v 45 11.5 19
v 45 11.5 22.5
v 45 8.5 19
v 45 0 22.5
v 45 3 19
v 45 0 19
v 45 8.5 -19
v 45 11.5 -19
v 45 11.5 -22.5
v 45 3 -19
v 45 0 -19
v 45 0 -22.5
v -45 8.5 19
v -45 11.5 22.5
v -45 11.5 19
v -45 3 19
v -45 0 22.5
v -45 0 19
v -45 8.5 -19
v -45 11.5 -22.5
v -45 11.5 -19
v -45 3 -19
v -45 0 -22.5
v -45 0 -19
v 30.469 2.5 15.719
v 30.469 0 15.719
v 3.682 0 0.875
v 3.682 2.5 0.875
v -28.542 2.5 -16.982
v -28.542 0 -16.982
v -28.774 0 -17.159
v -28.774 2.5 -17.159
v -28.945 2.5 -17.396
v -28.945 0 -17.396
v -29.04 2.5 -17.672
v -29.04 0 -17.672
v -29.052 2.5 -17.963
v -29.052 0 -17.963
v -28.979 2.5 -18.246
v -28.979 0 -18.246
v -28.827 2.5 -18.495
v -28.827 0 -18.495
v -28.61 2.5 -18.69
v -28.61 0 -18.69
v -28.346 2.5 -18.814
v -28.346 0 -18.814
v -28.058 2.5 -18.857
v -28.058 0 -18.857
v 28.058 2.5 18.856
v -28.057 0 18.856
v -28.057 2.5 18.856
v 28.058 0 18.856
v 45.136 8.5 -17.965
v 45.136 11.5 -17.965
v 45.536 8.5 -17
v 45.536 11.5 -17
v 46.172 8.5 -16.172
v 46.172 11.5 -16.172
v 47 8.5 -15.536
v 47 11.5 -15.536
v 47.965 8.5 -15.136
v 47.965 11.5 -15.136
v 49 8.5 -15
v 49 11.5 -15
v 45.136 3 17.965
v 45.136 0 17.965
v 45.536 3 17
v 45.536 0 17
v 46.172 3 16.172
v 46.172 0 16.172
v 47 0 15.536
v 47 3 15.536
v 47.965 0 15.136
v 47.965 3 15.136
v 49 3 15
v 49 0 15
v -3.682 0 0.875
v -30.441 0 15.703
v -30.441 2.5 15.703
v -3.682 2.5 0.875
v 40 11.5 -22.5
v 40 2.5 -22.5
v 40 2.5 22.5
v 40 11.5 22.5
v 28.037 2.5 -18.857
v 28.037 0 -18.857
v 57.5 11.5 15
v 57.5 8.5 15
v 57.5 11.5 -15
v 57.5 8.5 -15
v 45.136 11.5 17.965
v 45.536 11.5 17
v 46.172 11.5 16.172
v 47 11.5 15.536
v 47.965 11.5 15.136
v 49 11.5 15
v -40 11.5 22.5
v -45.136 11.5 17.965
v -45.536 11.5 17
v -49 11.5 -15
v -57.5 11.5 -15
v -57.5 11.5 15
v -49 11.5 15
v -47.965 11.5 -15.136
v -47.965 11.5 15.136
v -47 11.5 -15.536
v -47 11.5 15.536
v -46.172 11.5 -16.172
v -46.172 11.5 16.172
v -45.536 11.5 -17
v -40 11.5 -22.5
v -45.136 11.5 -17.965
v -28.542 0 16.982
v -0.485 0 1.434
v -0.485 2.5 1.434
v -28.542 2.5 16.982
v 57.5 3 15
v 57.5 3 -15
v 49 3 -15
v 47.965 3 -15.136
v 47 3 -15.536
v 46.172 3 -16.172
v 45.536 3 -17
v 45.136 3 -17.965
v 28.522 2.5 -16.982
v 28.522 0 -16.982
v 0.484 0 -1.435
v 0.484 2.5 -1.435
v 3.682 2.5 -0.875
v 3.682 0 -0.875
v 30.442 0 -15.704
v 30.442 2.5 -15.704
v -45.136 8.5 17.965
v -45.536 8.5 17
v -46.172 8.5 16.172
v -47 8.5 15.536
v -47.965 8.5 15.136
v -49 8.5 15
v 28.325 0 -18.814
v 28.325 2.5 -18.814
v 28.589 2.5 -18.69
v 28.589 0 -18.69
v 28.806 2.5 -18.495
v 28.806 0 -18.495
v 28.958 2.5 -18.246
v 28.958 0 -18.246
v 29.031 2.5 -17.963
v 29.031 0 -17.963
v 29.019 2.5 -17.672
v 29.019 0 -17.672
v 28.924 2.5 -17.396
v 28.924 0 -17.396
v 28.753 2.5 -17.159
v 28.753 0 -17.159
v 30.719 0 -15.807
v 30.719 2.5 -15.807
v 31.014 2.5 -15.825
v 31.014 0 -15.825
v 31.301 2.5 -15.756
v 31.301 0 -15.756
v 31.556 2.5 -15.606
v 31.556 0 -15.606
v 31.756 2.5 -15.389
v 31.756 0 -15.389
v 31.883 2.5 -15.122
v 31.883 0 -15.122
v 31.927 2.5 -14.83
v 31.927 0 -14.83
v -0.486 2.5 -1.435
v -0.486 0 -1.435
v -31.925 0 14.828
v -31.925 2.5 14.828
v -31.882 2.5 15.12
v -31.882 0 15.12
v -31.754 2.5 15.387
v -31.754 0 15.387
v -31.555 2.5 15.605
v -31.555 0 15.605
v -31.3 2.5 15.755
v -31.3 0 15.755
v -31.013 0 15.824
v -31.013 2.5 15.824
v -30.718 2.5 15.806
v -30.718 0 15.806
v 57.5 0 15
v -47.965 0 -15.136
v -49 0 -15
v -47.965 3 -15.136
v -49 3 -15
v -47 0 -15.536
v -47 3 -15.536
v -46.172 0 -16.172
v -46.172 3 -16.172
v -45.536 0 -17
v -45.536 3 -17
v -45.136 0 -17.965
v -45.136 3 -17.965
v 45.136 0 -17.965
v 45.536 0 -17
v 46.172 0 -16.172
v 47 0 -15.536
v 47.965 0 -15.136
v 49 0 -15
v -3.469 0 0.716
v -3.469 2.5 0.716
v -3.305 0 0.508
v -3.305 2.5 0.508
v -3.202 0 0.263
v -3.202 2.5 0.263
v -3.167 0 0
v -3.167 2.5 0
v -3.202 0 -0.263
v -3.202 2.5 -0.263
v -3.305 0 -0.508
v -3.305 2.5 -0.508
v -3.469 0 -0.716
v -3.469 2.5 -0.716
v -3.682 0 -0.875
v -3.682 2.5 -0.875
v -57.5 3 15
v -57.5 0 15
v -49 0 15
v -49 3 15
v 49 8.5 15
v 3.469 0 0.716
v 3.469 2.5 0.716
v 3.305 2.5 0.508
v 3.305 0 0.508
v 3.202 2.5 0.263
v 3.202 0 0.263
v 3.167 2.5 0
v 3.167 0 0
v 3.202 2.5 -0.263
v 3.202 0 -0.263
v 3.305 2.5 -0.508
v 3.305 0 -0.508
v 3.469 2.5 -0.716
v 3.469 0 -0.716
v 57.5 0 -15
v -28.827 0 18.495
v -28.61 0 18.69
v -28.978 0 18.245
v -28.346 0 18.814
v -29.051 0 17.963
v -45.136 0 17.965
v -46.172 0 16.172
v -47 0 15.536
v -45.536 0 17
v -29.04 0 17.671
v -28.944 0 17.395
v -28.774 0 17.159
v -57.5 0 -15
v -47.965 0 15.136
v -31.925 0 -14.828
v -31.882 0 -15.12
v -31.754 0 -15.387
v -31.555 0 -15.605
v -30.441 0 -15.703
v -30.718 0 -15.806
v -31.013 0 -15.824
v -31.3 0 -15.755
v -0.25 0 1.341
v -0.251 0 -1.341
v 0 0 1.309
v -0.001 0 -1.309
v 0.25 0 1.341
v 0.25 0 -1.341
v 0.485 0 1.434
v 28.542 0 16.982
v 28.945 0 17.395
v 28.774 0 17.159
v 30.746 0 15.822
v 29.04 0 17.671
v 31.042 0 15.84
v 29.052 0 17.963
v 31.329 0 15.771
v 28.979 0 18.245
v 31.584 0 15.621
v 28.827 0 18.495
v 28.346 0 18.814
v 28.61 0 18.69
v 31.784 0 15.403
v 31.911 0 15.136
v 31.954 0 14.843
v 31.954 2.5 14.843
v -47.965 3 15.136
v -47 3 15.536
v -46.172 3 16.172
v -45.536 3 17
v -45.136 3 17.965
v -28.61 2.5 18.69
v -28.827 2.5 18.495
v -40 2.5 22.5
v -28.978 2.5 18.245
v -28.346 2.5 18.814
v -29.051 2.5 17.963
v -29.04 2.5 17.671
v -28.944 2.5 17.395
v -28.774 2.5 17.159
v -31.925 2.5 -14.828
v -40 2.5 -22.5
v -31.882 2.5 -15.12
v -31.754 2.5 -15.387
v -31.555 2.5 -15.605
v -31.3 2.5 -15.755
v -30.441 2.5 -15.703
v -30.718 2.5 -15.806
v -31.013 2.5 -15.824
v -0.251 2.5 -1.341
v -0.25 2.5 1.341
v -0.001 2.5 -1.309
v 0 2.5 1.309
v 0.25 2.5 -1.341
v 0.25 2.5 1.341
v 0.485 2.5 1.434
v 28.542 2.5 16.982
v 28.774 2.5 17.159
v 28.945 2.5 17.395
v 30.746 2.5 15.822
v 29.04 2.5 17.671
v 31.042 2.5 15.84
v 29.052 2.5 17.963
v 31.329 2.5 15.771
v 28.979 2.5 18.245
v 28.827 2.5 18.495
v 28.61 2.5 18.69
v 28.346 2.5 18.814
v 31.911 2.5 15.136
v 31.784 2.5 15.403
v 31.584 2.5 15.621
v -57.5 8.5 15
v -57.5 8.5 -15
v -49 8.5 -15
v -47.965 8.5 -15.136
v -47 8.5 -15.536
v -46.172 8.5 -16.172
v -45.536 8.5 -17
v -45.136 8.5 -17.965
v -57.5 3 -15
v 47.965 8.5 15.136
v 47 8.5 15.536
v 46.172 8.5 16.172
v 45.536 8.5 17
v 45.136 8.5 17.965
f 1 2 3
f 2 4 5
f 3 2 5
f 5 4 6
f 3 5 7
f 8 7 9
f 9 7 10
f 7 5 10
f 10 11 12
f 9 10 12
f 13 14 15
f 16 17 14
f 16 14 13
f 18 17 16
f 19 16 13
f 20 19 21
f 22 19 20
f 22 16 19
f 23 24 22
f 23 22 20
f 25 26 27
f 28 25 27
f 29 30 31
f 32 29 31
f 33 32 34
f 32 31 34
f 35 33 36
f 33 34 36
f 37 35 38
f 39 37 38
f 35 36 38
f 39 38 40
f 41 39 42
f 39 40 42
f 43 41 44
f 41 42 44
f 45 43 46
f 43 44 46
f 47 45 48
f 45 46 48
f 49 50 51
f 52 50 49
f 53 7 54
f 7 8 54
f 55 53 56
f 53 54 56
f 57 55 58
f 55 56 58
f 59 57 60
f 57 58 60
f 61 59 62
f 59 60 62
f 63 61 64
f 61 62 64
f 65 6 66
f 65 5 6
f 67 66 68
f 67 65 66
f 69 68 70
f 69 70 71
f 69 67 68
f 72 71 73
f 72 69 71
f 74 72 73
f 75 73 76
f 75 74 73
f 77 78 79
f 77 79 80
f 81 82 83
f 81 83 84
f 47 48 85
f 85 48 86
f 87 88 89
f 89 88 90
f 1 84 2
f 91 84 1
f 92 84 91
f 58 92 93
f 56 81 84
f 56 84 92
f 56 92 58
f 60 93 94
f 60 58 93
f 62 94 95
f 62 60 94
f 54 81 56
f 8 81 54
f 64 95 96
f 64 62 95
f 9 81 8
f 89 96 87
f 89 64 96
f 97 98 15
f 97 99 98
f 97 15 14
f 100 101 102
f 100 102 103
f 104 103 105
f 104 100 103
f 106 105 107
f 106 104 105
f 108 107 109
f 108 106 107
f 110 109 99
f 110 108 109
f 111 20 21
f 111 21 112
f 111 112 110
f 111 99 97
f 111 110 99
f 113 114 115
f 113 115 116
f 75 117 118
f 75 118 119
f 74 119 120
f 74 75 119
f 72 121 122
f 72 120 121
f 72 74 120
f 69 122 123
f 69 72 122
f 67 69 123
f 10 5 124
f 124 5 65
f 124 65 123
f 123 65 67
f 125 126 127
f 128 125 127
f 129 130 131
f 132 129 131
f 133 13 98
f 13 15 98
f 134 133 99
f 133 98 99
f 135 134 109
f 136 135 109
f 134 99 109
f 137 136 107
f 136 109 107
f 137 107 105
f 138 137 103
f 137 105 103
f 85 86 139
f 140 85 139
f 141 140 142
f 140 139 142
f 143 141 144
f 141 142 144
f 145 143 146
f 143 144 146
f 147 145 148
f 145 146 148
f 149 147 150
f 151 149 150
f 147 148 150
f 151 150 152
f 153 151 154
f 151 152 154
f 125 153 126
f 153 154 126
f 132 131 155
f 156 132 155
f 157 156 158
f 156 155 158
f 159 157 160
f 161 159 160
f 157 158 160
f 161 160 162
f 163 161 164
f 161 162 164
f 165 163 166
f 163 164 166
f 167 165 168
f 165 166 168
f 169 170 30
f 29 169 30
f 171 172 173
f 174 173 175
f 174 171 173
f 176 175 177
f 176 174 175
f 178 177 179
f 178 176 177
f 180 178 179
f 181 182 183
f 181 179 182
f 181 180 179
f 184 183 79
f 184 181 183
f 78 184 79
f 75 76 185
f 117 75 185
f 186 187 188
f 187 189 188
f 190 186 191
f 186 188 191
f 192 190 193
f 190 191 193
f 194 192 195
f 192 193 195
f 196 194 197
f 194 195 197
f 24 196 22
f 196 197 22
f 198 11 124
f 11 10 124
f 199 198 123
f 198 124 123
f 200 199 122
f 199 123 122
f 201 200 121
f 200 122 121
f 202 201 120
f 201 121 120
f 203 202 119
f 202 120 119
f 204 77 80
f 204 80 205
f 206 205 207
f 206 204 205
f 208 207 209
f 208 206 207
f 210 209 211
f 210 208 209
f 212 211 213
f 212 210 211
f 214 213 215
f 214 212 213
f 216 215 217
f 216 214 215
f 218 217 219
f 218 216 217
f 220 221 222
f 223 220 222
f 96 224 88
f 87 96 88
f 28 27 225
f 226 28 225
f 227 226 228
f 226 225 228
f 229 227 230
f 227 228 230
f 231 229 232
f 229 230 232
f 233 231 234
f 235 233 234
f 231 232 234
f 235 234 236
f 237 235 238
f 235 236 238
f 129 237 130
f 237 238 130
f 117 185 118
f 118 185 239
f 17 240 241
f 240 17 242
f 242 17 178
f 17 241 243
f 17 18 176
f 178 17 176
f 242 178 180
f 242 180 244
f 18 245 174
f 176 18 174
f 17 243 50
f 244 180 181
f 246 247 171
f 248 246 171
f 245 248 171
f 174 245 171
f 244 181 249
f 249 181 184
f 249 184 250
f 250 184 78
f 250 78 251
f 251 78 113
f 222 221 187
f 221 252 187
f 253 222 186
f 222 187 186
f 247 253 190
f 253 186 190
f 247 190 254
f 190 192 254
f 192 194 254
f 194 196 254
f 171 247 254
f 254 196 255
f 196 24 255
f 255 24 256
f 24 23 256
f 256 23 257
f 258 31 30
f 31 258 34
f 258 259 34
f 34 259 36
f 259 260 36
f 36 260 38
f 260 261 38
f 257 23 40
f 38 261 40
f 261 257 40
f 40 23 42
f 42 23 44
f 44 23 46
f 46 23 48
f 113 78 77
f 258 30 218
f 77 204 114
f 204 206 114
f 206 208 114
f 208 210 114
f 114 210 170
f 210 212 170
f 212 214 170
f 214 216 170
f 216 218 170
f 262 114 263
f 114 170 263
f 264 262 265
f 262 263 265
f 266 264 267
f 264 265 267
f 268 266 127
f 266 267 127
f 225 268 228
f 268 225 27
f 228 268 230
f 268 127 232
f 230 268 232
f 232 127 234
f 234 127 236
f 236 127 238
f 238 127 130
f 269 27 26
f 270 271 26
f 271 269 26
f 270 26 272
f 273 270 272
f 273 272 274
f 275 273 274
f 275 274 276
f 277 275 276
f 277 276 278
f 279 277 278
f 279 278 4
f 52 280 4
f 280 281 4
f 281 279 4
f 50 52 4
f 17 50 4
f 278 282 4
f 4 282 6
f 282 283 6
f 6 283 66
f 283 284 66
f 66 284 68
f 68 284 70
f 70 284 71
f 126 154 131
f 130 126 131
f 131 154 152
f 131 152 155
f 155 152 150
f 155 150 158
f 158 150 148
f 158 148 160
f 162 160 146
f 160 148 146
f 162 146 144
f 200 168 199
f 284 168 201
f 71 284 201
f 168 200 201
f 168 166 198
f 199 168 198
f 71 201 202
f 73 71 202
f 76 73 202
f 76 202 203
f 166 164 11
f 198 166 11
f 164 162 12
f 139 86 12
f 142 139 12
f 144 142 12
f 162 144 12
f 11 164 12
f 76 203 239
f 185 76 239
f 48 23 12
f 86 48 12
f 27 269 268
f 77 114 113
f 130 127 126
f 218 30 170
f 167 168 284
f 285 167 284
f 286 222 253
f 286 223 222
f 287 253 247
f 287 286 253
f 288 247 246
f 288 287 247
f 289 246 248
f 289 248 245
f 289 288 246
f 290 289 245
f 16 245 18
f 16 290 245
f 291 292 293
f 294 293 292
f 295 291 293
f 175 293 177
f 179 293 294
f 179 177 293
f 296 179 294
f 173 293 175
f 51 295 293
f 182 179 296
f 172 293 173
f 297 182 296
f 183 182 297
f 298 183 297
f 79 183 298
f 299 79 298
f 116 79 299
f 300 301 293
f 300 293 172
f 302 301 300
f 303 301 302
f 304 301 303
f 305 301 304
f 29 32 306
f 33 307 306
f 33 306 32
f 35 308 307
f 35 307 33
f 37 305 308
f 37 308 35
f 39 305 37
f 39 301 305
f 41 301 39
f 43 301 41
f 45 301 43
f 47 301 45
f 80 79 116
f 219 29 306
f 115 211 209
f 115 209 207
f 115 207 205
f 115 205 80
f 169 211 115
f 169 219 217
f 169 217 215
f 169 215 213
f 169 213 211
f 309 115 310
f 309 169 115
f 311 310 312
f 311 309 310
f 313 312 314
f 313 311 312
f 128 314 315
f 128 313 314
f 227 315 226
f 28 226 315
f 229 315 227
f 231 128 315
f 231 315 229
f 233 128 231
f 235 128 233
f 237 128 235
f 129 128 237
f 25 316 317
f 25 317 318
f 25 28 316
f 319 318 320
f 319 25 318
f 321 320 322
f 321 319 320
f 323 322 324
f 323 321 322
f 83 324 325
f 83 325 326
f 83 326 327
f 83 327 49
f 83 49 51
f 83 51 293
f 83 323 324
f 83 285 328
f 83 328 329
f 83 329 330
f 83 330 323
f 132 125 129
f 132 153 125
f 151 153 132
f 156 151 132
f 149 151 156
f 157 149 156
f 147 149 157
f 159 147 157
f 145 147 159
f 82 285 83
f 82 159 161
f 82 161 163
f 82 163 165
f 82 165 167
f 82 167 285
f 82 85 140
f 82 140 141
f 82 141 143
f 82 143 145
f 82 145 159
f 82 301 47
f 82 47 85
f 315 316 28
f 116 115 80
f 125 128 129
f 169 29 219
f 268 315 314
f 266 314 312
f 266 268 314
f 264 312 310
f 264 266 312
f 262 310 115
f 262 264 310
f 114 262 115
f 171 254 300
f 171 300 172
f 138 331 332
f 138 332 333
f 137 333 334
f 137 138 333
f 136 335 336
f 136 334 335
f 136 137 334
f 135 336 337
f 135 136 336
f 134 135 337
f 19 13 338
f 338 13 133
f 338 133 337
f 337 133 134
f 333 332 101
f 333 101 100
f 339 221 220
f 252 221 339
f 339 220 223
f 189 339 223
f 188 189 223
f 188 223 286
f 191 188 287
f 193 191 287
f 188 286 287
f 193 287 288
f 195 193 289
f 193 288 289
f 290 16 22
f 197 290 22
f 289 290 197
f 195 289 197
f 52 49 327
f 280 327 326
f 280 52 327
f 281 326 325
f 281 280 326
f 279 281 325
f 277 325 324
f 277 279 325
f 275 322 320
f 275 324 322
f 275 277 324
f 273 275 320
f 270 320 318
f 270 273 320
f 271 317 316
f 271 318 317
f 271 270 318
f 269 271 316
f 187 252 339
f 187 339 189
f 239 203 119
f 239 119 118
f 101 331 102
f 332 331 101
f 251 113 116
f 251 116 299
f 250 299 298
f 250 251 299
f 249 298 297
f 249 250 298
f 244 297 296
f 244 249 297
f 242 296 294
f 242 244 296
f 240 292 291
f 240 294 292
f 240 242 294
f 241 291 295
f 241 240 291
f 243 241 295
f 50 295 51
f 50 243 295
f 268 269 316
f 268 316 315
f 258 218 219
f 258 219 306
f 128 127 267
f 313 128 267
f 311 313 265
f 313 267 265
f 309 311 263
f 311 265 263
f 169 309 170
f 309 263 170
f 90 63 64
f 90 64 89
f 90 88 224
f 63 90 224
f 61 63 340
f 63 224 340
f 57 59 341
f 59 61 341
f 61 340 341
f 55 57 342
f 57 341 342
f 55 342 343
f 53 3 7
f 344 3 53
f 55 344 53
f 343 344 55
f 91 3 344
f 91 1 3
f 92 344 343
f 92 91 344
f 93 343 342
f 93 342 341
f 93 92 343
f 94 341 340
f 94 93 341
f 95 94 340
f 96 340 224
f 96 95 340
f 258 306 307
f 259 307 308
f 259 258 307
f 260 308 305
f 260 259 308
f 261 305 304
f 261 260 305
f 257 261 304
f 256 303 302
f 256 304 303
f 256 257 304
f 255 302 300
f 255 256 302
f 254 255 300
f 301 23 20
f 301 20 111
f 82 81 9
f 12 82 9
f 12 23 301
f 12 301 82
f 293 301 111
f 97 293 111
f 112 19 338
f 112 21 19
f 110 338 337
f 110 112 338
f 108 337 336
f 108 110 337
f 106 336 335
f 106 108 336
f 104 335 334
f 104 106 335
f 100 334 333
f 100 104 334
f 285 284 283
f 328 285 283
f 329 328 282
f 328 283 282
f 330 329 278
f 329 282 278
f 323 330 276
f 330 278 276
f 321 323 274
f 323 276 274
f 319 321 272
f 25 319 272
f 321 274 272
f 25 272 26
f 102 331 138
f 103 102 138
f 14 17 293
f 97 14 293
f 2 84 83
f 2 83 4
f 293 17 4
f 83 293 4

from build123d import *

# Parameters (mm, degrees)
SKETCH1_W               = 12.5
SKETCH1_H               = 30
SKETCH1_W_2             = 90
SKETCH1_H_2             = 7.5
BOSS_EXTRUDE1_DEPTH     = 11.5
SKETCH2_W               = 12.5
SKETCH2_H               = 5.5
CUT_EXTRUDE1_DEPTH      = 70.604238377
CUT_EXTRUDE2_DEPTH      = 74.915492287
CUT_EXTRUDE2_DEPTH_BACK = 74.915492287
SKETCH3_W               = 80
SKETCH3_H               = 9
FILLET1_R               = 4
CUT_EXTRUDE4_DEPTH      = 10


with BuildPart() as part:
    # Sketch1 → Boss-Extrude1 (new body)
    with BuildSketch(Plane(origin=(0, 0, 0), x_dir=(1, 0, 0), z_dir=(0, 1, 0))):
        with Locations((-51.25, 0)):
            Rectangle(SKETCH1_W, SKETCH1_H)
        with Locations((0, 18.75)):
            Rectangle(SKETCH1_W_2, SKETCH1_H_2)
        Rectangle(SKETCH1_W_2, SKETCH1_H)
        with Locations((0, -18.75)):
            Rectangle(SKETCH1_W_2, SKETCH1_H_2)
        with Locations((51.25, 0)):
            Rectangle(SKETCH1_W, SKETCH1_H)
    extrude(amount=BOSS_EXTRUDE1_DEPTH)

    # Sketch2 → Cut-Extrude1 (cut, through all)
    with BuildSketch(Plane.XY.offset(15)):
        with Locations((-51.25, 5.75)):
            Rectangle(SKETCH2_W, SKETCH2_H)
    cut_extrude1 = extrude(amount=-CUT_EXTRUDE1_DEPTH, mode=Mode.SUBTRACT)

    # Mirror1: Cut-Extrude1 across plane
    add(cut_extrude1.mirror(Plane(origin=(0, 0, 0), x_dir=(0, 0, 1), z_dir=(1, 0, 0))), mode=Mode.SUBTRACT)

    # Sketch3 → Cut-Extrude2 (cut, two sides: drawn at the far end of the back side and taken through both)
    with BuildSketch(Plane.XY.offset(22.5).offset(-CUT_EXTRUDE2_DEPTH_BACK)):
        with Locations((0, 7)):
            Rectangle(SKETCH3_W, SKETCH3_H)
    extrude(amount=CUT_EXTRUDE2_DEPTH + CUT_EXTRUDE2_DEPTH_BACK, mode=Mode.SUBTRACT)

    # Fillet1
    fillet1_edges = [part.edges().sort_by_distance(p)[0] for p in [
        (-45, 10, -15),
        (45, 10, -15),
        (45, 10, 15),
        (-45, 10, 15),
        (-45, 1.5, -15),
        (-45, 1.5, 15),
        (45, 1.5, -15),
        (45, 1.5, 15),
    ]]
    fillet(fillet1_edges, radius=FILLET1_R)

    # Sketch4 → Cut-Extrude4 (cut)
    with BuildSketch(Plane.XZ):
        with BuildLine():
            Line((28.542243556, 16.981698246), (0.484736979, 1.434191182))
            ThreePointArc((0.484736979, 1.434191182), (1.9718e-05, 1.308871184), (-0.484696575, 1.434194926))
            Line((-0.484696575, 1.434194926), (-28.54169207, 16.981701989))
            ThreePointArc((-28.54169207, 16.981701989), (-29.025159296, 18.106701788), (-28.05699548, 18.856384341))
            Line((-28.05699548, 18.856384341), (28.057553721, 18.856384341))
            ThreePointArc((28.057553721, 18.856384341), (29.025718505, 18.106698049), (28.542243556, 16.981698246))
        make_face()
        with BuildLine():
            Line((30.469394666, 15.718709145), (3.68189804, 0.874682353))
            ThreePointArc((3.68189804, 0.874682353), (3.166594631, 4e-09), (3.68189804, -0.874682346))
            Line((3.68189804, -0.874682346), (30.442216306, -15.703648524))
            ThreePointArc((30.442216306, -15.703648524), (31.434112297, -15.690794907), (31.926912476, -14.829882101))
            Line((31.926912476, -14.829882101), (31.954090836, 14.843110865))
            ThreePointArc((31.954090836, 14.843110865), (31.462079818, 15.705390608), (30.469394666, 15.718709145))
        make_face()
        with BuildLine():
            Line((-3.681898037, -0.874682351), (-30.440662807, -15.70278767))
            ThreePointArc((-30.440662807, -15.70278767), (-31.432953433, -15.689701683), (-31.925359397, -14.828105319))
            Line((-31.925359397, -14.828105319), (-31.925359397, 14.828105319))
            ThreePointArc((-31.925359397, 14.828105319), (-31.432953433, 15.689701683), (-30.440662807, 15.70278767))
            Line((-30.440662807, 15.70278767), (-3.681898036, 0.874682346))
            ThreePointArc((-3.681898036, 0.874682346), (-3.166594628, -3e-09), (-3.681898037, -0.874682351))
        make_face()
        with BuildLine():
            Line((-28.057615345, -18.856727819), (28.036669402, -18.856727819))
            ThreePointArc((28.036669402, -18.856727819), (29.004796923, -18.107185608), (28.521619558, -16.982186027))
            Line((28.521619558, -16.982186027), (0.484065329, -1.434825803))
            ThreePointArc((0.484065329, -1.434825803), (-0.000739868, -1.309367606), (-0.485581416, -1.434685244))
            Line((-0.485581416, -1.434685244), (-28.542311935, -16.982045468))
            ThreePointArc((-28.542311935, -16.982045468), (-29.025779162, -18.107045266), (-28.057615345, -18.856727819))
        make_face()
    extrude(amount=-CUT_EXTRUDE4_DEPTH, mode=Mode.SUBTRACT)


solid = part.part
